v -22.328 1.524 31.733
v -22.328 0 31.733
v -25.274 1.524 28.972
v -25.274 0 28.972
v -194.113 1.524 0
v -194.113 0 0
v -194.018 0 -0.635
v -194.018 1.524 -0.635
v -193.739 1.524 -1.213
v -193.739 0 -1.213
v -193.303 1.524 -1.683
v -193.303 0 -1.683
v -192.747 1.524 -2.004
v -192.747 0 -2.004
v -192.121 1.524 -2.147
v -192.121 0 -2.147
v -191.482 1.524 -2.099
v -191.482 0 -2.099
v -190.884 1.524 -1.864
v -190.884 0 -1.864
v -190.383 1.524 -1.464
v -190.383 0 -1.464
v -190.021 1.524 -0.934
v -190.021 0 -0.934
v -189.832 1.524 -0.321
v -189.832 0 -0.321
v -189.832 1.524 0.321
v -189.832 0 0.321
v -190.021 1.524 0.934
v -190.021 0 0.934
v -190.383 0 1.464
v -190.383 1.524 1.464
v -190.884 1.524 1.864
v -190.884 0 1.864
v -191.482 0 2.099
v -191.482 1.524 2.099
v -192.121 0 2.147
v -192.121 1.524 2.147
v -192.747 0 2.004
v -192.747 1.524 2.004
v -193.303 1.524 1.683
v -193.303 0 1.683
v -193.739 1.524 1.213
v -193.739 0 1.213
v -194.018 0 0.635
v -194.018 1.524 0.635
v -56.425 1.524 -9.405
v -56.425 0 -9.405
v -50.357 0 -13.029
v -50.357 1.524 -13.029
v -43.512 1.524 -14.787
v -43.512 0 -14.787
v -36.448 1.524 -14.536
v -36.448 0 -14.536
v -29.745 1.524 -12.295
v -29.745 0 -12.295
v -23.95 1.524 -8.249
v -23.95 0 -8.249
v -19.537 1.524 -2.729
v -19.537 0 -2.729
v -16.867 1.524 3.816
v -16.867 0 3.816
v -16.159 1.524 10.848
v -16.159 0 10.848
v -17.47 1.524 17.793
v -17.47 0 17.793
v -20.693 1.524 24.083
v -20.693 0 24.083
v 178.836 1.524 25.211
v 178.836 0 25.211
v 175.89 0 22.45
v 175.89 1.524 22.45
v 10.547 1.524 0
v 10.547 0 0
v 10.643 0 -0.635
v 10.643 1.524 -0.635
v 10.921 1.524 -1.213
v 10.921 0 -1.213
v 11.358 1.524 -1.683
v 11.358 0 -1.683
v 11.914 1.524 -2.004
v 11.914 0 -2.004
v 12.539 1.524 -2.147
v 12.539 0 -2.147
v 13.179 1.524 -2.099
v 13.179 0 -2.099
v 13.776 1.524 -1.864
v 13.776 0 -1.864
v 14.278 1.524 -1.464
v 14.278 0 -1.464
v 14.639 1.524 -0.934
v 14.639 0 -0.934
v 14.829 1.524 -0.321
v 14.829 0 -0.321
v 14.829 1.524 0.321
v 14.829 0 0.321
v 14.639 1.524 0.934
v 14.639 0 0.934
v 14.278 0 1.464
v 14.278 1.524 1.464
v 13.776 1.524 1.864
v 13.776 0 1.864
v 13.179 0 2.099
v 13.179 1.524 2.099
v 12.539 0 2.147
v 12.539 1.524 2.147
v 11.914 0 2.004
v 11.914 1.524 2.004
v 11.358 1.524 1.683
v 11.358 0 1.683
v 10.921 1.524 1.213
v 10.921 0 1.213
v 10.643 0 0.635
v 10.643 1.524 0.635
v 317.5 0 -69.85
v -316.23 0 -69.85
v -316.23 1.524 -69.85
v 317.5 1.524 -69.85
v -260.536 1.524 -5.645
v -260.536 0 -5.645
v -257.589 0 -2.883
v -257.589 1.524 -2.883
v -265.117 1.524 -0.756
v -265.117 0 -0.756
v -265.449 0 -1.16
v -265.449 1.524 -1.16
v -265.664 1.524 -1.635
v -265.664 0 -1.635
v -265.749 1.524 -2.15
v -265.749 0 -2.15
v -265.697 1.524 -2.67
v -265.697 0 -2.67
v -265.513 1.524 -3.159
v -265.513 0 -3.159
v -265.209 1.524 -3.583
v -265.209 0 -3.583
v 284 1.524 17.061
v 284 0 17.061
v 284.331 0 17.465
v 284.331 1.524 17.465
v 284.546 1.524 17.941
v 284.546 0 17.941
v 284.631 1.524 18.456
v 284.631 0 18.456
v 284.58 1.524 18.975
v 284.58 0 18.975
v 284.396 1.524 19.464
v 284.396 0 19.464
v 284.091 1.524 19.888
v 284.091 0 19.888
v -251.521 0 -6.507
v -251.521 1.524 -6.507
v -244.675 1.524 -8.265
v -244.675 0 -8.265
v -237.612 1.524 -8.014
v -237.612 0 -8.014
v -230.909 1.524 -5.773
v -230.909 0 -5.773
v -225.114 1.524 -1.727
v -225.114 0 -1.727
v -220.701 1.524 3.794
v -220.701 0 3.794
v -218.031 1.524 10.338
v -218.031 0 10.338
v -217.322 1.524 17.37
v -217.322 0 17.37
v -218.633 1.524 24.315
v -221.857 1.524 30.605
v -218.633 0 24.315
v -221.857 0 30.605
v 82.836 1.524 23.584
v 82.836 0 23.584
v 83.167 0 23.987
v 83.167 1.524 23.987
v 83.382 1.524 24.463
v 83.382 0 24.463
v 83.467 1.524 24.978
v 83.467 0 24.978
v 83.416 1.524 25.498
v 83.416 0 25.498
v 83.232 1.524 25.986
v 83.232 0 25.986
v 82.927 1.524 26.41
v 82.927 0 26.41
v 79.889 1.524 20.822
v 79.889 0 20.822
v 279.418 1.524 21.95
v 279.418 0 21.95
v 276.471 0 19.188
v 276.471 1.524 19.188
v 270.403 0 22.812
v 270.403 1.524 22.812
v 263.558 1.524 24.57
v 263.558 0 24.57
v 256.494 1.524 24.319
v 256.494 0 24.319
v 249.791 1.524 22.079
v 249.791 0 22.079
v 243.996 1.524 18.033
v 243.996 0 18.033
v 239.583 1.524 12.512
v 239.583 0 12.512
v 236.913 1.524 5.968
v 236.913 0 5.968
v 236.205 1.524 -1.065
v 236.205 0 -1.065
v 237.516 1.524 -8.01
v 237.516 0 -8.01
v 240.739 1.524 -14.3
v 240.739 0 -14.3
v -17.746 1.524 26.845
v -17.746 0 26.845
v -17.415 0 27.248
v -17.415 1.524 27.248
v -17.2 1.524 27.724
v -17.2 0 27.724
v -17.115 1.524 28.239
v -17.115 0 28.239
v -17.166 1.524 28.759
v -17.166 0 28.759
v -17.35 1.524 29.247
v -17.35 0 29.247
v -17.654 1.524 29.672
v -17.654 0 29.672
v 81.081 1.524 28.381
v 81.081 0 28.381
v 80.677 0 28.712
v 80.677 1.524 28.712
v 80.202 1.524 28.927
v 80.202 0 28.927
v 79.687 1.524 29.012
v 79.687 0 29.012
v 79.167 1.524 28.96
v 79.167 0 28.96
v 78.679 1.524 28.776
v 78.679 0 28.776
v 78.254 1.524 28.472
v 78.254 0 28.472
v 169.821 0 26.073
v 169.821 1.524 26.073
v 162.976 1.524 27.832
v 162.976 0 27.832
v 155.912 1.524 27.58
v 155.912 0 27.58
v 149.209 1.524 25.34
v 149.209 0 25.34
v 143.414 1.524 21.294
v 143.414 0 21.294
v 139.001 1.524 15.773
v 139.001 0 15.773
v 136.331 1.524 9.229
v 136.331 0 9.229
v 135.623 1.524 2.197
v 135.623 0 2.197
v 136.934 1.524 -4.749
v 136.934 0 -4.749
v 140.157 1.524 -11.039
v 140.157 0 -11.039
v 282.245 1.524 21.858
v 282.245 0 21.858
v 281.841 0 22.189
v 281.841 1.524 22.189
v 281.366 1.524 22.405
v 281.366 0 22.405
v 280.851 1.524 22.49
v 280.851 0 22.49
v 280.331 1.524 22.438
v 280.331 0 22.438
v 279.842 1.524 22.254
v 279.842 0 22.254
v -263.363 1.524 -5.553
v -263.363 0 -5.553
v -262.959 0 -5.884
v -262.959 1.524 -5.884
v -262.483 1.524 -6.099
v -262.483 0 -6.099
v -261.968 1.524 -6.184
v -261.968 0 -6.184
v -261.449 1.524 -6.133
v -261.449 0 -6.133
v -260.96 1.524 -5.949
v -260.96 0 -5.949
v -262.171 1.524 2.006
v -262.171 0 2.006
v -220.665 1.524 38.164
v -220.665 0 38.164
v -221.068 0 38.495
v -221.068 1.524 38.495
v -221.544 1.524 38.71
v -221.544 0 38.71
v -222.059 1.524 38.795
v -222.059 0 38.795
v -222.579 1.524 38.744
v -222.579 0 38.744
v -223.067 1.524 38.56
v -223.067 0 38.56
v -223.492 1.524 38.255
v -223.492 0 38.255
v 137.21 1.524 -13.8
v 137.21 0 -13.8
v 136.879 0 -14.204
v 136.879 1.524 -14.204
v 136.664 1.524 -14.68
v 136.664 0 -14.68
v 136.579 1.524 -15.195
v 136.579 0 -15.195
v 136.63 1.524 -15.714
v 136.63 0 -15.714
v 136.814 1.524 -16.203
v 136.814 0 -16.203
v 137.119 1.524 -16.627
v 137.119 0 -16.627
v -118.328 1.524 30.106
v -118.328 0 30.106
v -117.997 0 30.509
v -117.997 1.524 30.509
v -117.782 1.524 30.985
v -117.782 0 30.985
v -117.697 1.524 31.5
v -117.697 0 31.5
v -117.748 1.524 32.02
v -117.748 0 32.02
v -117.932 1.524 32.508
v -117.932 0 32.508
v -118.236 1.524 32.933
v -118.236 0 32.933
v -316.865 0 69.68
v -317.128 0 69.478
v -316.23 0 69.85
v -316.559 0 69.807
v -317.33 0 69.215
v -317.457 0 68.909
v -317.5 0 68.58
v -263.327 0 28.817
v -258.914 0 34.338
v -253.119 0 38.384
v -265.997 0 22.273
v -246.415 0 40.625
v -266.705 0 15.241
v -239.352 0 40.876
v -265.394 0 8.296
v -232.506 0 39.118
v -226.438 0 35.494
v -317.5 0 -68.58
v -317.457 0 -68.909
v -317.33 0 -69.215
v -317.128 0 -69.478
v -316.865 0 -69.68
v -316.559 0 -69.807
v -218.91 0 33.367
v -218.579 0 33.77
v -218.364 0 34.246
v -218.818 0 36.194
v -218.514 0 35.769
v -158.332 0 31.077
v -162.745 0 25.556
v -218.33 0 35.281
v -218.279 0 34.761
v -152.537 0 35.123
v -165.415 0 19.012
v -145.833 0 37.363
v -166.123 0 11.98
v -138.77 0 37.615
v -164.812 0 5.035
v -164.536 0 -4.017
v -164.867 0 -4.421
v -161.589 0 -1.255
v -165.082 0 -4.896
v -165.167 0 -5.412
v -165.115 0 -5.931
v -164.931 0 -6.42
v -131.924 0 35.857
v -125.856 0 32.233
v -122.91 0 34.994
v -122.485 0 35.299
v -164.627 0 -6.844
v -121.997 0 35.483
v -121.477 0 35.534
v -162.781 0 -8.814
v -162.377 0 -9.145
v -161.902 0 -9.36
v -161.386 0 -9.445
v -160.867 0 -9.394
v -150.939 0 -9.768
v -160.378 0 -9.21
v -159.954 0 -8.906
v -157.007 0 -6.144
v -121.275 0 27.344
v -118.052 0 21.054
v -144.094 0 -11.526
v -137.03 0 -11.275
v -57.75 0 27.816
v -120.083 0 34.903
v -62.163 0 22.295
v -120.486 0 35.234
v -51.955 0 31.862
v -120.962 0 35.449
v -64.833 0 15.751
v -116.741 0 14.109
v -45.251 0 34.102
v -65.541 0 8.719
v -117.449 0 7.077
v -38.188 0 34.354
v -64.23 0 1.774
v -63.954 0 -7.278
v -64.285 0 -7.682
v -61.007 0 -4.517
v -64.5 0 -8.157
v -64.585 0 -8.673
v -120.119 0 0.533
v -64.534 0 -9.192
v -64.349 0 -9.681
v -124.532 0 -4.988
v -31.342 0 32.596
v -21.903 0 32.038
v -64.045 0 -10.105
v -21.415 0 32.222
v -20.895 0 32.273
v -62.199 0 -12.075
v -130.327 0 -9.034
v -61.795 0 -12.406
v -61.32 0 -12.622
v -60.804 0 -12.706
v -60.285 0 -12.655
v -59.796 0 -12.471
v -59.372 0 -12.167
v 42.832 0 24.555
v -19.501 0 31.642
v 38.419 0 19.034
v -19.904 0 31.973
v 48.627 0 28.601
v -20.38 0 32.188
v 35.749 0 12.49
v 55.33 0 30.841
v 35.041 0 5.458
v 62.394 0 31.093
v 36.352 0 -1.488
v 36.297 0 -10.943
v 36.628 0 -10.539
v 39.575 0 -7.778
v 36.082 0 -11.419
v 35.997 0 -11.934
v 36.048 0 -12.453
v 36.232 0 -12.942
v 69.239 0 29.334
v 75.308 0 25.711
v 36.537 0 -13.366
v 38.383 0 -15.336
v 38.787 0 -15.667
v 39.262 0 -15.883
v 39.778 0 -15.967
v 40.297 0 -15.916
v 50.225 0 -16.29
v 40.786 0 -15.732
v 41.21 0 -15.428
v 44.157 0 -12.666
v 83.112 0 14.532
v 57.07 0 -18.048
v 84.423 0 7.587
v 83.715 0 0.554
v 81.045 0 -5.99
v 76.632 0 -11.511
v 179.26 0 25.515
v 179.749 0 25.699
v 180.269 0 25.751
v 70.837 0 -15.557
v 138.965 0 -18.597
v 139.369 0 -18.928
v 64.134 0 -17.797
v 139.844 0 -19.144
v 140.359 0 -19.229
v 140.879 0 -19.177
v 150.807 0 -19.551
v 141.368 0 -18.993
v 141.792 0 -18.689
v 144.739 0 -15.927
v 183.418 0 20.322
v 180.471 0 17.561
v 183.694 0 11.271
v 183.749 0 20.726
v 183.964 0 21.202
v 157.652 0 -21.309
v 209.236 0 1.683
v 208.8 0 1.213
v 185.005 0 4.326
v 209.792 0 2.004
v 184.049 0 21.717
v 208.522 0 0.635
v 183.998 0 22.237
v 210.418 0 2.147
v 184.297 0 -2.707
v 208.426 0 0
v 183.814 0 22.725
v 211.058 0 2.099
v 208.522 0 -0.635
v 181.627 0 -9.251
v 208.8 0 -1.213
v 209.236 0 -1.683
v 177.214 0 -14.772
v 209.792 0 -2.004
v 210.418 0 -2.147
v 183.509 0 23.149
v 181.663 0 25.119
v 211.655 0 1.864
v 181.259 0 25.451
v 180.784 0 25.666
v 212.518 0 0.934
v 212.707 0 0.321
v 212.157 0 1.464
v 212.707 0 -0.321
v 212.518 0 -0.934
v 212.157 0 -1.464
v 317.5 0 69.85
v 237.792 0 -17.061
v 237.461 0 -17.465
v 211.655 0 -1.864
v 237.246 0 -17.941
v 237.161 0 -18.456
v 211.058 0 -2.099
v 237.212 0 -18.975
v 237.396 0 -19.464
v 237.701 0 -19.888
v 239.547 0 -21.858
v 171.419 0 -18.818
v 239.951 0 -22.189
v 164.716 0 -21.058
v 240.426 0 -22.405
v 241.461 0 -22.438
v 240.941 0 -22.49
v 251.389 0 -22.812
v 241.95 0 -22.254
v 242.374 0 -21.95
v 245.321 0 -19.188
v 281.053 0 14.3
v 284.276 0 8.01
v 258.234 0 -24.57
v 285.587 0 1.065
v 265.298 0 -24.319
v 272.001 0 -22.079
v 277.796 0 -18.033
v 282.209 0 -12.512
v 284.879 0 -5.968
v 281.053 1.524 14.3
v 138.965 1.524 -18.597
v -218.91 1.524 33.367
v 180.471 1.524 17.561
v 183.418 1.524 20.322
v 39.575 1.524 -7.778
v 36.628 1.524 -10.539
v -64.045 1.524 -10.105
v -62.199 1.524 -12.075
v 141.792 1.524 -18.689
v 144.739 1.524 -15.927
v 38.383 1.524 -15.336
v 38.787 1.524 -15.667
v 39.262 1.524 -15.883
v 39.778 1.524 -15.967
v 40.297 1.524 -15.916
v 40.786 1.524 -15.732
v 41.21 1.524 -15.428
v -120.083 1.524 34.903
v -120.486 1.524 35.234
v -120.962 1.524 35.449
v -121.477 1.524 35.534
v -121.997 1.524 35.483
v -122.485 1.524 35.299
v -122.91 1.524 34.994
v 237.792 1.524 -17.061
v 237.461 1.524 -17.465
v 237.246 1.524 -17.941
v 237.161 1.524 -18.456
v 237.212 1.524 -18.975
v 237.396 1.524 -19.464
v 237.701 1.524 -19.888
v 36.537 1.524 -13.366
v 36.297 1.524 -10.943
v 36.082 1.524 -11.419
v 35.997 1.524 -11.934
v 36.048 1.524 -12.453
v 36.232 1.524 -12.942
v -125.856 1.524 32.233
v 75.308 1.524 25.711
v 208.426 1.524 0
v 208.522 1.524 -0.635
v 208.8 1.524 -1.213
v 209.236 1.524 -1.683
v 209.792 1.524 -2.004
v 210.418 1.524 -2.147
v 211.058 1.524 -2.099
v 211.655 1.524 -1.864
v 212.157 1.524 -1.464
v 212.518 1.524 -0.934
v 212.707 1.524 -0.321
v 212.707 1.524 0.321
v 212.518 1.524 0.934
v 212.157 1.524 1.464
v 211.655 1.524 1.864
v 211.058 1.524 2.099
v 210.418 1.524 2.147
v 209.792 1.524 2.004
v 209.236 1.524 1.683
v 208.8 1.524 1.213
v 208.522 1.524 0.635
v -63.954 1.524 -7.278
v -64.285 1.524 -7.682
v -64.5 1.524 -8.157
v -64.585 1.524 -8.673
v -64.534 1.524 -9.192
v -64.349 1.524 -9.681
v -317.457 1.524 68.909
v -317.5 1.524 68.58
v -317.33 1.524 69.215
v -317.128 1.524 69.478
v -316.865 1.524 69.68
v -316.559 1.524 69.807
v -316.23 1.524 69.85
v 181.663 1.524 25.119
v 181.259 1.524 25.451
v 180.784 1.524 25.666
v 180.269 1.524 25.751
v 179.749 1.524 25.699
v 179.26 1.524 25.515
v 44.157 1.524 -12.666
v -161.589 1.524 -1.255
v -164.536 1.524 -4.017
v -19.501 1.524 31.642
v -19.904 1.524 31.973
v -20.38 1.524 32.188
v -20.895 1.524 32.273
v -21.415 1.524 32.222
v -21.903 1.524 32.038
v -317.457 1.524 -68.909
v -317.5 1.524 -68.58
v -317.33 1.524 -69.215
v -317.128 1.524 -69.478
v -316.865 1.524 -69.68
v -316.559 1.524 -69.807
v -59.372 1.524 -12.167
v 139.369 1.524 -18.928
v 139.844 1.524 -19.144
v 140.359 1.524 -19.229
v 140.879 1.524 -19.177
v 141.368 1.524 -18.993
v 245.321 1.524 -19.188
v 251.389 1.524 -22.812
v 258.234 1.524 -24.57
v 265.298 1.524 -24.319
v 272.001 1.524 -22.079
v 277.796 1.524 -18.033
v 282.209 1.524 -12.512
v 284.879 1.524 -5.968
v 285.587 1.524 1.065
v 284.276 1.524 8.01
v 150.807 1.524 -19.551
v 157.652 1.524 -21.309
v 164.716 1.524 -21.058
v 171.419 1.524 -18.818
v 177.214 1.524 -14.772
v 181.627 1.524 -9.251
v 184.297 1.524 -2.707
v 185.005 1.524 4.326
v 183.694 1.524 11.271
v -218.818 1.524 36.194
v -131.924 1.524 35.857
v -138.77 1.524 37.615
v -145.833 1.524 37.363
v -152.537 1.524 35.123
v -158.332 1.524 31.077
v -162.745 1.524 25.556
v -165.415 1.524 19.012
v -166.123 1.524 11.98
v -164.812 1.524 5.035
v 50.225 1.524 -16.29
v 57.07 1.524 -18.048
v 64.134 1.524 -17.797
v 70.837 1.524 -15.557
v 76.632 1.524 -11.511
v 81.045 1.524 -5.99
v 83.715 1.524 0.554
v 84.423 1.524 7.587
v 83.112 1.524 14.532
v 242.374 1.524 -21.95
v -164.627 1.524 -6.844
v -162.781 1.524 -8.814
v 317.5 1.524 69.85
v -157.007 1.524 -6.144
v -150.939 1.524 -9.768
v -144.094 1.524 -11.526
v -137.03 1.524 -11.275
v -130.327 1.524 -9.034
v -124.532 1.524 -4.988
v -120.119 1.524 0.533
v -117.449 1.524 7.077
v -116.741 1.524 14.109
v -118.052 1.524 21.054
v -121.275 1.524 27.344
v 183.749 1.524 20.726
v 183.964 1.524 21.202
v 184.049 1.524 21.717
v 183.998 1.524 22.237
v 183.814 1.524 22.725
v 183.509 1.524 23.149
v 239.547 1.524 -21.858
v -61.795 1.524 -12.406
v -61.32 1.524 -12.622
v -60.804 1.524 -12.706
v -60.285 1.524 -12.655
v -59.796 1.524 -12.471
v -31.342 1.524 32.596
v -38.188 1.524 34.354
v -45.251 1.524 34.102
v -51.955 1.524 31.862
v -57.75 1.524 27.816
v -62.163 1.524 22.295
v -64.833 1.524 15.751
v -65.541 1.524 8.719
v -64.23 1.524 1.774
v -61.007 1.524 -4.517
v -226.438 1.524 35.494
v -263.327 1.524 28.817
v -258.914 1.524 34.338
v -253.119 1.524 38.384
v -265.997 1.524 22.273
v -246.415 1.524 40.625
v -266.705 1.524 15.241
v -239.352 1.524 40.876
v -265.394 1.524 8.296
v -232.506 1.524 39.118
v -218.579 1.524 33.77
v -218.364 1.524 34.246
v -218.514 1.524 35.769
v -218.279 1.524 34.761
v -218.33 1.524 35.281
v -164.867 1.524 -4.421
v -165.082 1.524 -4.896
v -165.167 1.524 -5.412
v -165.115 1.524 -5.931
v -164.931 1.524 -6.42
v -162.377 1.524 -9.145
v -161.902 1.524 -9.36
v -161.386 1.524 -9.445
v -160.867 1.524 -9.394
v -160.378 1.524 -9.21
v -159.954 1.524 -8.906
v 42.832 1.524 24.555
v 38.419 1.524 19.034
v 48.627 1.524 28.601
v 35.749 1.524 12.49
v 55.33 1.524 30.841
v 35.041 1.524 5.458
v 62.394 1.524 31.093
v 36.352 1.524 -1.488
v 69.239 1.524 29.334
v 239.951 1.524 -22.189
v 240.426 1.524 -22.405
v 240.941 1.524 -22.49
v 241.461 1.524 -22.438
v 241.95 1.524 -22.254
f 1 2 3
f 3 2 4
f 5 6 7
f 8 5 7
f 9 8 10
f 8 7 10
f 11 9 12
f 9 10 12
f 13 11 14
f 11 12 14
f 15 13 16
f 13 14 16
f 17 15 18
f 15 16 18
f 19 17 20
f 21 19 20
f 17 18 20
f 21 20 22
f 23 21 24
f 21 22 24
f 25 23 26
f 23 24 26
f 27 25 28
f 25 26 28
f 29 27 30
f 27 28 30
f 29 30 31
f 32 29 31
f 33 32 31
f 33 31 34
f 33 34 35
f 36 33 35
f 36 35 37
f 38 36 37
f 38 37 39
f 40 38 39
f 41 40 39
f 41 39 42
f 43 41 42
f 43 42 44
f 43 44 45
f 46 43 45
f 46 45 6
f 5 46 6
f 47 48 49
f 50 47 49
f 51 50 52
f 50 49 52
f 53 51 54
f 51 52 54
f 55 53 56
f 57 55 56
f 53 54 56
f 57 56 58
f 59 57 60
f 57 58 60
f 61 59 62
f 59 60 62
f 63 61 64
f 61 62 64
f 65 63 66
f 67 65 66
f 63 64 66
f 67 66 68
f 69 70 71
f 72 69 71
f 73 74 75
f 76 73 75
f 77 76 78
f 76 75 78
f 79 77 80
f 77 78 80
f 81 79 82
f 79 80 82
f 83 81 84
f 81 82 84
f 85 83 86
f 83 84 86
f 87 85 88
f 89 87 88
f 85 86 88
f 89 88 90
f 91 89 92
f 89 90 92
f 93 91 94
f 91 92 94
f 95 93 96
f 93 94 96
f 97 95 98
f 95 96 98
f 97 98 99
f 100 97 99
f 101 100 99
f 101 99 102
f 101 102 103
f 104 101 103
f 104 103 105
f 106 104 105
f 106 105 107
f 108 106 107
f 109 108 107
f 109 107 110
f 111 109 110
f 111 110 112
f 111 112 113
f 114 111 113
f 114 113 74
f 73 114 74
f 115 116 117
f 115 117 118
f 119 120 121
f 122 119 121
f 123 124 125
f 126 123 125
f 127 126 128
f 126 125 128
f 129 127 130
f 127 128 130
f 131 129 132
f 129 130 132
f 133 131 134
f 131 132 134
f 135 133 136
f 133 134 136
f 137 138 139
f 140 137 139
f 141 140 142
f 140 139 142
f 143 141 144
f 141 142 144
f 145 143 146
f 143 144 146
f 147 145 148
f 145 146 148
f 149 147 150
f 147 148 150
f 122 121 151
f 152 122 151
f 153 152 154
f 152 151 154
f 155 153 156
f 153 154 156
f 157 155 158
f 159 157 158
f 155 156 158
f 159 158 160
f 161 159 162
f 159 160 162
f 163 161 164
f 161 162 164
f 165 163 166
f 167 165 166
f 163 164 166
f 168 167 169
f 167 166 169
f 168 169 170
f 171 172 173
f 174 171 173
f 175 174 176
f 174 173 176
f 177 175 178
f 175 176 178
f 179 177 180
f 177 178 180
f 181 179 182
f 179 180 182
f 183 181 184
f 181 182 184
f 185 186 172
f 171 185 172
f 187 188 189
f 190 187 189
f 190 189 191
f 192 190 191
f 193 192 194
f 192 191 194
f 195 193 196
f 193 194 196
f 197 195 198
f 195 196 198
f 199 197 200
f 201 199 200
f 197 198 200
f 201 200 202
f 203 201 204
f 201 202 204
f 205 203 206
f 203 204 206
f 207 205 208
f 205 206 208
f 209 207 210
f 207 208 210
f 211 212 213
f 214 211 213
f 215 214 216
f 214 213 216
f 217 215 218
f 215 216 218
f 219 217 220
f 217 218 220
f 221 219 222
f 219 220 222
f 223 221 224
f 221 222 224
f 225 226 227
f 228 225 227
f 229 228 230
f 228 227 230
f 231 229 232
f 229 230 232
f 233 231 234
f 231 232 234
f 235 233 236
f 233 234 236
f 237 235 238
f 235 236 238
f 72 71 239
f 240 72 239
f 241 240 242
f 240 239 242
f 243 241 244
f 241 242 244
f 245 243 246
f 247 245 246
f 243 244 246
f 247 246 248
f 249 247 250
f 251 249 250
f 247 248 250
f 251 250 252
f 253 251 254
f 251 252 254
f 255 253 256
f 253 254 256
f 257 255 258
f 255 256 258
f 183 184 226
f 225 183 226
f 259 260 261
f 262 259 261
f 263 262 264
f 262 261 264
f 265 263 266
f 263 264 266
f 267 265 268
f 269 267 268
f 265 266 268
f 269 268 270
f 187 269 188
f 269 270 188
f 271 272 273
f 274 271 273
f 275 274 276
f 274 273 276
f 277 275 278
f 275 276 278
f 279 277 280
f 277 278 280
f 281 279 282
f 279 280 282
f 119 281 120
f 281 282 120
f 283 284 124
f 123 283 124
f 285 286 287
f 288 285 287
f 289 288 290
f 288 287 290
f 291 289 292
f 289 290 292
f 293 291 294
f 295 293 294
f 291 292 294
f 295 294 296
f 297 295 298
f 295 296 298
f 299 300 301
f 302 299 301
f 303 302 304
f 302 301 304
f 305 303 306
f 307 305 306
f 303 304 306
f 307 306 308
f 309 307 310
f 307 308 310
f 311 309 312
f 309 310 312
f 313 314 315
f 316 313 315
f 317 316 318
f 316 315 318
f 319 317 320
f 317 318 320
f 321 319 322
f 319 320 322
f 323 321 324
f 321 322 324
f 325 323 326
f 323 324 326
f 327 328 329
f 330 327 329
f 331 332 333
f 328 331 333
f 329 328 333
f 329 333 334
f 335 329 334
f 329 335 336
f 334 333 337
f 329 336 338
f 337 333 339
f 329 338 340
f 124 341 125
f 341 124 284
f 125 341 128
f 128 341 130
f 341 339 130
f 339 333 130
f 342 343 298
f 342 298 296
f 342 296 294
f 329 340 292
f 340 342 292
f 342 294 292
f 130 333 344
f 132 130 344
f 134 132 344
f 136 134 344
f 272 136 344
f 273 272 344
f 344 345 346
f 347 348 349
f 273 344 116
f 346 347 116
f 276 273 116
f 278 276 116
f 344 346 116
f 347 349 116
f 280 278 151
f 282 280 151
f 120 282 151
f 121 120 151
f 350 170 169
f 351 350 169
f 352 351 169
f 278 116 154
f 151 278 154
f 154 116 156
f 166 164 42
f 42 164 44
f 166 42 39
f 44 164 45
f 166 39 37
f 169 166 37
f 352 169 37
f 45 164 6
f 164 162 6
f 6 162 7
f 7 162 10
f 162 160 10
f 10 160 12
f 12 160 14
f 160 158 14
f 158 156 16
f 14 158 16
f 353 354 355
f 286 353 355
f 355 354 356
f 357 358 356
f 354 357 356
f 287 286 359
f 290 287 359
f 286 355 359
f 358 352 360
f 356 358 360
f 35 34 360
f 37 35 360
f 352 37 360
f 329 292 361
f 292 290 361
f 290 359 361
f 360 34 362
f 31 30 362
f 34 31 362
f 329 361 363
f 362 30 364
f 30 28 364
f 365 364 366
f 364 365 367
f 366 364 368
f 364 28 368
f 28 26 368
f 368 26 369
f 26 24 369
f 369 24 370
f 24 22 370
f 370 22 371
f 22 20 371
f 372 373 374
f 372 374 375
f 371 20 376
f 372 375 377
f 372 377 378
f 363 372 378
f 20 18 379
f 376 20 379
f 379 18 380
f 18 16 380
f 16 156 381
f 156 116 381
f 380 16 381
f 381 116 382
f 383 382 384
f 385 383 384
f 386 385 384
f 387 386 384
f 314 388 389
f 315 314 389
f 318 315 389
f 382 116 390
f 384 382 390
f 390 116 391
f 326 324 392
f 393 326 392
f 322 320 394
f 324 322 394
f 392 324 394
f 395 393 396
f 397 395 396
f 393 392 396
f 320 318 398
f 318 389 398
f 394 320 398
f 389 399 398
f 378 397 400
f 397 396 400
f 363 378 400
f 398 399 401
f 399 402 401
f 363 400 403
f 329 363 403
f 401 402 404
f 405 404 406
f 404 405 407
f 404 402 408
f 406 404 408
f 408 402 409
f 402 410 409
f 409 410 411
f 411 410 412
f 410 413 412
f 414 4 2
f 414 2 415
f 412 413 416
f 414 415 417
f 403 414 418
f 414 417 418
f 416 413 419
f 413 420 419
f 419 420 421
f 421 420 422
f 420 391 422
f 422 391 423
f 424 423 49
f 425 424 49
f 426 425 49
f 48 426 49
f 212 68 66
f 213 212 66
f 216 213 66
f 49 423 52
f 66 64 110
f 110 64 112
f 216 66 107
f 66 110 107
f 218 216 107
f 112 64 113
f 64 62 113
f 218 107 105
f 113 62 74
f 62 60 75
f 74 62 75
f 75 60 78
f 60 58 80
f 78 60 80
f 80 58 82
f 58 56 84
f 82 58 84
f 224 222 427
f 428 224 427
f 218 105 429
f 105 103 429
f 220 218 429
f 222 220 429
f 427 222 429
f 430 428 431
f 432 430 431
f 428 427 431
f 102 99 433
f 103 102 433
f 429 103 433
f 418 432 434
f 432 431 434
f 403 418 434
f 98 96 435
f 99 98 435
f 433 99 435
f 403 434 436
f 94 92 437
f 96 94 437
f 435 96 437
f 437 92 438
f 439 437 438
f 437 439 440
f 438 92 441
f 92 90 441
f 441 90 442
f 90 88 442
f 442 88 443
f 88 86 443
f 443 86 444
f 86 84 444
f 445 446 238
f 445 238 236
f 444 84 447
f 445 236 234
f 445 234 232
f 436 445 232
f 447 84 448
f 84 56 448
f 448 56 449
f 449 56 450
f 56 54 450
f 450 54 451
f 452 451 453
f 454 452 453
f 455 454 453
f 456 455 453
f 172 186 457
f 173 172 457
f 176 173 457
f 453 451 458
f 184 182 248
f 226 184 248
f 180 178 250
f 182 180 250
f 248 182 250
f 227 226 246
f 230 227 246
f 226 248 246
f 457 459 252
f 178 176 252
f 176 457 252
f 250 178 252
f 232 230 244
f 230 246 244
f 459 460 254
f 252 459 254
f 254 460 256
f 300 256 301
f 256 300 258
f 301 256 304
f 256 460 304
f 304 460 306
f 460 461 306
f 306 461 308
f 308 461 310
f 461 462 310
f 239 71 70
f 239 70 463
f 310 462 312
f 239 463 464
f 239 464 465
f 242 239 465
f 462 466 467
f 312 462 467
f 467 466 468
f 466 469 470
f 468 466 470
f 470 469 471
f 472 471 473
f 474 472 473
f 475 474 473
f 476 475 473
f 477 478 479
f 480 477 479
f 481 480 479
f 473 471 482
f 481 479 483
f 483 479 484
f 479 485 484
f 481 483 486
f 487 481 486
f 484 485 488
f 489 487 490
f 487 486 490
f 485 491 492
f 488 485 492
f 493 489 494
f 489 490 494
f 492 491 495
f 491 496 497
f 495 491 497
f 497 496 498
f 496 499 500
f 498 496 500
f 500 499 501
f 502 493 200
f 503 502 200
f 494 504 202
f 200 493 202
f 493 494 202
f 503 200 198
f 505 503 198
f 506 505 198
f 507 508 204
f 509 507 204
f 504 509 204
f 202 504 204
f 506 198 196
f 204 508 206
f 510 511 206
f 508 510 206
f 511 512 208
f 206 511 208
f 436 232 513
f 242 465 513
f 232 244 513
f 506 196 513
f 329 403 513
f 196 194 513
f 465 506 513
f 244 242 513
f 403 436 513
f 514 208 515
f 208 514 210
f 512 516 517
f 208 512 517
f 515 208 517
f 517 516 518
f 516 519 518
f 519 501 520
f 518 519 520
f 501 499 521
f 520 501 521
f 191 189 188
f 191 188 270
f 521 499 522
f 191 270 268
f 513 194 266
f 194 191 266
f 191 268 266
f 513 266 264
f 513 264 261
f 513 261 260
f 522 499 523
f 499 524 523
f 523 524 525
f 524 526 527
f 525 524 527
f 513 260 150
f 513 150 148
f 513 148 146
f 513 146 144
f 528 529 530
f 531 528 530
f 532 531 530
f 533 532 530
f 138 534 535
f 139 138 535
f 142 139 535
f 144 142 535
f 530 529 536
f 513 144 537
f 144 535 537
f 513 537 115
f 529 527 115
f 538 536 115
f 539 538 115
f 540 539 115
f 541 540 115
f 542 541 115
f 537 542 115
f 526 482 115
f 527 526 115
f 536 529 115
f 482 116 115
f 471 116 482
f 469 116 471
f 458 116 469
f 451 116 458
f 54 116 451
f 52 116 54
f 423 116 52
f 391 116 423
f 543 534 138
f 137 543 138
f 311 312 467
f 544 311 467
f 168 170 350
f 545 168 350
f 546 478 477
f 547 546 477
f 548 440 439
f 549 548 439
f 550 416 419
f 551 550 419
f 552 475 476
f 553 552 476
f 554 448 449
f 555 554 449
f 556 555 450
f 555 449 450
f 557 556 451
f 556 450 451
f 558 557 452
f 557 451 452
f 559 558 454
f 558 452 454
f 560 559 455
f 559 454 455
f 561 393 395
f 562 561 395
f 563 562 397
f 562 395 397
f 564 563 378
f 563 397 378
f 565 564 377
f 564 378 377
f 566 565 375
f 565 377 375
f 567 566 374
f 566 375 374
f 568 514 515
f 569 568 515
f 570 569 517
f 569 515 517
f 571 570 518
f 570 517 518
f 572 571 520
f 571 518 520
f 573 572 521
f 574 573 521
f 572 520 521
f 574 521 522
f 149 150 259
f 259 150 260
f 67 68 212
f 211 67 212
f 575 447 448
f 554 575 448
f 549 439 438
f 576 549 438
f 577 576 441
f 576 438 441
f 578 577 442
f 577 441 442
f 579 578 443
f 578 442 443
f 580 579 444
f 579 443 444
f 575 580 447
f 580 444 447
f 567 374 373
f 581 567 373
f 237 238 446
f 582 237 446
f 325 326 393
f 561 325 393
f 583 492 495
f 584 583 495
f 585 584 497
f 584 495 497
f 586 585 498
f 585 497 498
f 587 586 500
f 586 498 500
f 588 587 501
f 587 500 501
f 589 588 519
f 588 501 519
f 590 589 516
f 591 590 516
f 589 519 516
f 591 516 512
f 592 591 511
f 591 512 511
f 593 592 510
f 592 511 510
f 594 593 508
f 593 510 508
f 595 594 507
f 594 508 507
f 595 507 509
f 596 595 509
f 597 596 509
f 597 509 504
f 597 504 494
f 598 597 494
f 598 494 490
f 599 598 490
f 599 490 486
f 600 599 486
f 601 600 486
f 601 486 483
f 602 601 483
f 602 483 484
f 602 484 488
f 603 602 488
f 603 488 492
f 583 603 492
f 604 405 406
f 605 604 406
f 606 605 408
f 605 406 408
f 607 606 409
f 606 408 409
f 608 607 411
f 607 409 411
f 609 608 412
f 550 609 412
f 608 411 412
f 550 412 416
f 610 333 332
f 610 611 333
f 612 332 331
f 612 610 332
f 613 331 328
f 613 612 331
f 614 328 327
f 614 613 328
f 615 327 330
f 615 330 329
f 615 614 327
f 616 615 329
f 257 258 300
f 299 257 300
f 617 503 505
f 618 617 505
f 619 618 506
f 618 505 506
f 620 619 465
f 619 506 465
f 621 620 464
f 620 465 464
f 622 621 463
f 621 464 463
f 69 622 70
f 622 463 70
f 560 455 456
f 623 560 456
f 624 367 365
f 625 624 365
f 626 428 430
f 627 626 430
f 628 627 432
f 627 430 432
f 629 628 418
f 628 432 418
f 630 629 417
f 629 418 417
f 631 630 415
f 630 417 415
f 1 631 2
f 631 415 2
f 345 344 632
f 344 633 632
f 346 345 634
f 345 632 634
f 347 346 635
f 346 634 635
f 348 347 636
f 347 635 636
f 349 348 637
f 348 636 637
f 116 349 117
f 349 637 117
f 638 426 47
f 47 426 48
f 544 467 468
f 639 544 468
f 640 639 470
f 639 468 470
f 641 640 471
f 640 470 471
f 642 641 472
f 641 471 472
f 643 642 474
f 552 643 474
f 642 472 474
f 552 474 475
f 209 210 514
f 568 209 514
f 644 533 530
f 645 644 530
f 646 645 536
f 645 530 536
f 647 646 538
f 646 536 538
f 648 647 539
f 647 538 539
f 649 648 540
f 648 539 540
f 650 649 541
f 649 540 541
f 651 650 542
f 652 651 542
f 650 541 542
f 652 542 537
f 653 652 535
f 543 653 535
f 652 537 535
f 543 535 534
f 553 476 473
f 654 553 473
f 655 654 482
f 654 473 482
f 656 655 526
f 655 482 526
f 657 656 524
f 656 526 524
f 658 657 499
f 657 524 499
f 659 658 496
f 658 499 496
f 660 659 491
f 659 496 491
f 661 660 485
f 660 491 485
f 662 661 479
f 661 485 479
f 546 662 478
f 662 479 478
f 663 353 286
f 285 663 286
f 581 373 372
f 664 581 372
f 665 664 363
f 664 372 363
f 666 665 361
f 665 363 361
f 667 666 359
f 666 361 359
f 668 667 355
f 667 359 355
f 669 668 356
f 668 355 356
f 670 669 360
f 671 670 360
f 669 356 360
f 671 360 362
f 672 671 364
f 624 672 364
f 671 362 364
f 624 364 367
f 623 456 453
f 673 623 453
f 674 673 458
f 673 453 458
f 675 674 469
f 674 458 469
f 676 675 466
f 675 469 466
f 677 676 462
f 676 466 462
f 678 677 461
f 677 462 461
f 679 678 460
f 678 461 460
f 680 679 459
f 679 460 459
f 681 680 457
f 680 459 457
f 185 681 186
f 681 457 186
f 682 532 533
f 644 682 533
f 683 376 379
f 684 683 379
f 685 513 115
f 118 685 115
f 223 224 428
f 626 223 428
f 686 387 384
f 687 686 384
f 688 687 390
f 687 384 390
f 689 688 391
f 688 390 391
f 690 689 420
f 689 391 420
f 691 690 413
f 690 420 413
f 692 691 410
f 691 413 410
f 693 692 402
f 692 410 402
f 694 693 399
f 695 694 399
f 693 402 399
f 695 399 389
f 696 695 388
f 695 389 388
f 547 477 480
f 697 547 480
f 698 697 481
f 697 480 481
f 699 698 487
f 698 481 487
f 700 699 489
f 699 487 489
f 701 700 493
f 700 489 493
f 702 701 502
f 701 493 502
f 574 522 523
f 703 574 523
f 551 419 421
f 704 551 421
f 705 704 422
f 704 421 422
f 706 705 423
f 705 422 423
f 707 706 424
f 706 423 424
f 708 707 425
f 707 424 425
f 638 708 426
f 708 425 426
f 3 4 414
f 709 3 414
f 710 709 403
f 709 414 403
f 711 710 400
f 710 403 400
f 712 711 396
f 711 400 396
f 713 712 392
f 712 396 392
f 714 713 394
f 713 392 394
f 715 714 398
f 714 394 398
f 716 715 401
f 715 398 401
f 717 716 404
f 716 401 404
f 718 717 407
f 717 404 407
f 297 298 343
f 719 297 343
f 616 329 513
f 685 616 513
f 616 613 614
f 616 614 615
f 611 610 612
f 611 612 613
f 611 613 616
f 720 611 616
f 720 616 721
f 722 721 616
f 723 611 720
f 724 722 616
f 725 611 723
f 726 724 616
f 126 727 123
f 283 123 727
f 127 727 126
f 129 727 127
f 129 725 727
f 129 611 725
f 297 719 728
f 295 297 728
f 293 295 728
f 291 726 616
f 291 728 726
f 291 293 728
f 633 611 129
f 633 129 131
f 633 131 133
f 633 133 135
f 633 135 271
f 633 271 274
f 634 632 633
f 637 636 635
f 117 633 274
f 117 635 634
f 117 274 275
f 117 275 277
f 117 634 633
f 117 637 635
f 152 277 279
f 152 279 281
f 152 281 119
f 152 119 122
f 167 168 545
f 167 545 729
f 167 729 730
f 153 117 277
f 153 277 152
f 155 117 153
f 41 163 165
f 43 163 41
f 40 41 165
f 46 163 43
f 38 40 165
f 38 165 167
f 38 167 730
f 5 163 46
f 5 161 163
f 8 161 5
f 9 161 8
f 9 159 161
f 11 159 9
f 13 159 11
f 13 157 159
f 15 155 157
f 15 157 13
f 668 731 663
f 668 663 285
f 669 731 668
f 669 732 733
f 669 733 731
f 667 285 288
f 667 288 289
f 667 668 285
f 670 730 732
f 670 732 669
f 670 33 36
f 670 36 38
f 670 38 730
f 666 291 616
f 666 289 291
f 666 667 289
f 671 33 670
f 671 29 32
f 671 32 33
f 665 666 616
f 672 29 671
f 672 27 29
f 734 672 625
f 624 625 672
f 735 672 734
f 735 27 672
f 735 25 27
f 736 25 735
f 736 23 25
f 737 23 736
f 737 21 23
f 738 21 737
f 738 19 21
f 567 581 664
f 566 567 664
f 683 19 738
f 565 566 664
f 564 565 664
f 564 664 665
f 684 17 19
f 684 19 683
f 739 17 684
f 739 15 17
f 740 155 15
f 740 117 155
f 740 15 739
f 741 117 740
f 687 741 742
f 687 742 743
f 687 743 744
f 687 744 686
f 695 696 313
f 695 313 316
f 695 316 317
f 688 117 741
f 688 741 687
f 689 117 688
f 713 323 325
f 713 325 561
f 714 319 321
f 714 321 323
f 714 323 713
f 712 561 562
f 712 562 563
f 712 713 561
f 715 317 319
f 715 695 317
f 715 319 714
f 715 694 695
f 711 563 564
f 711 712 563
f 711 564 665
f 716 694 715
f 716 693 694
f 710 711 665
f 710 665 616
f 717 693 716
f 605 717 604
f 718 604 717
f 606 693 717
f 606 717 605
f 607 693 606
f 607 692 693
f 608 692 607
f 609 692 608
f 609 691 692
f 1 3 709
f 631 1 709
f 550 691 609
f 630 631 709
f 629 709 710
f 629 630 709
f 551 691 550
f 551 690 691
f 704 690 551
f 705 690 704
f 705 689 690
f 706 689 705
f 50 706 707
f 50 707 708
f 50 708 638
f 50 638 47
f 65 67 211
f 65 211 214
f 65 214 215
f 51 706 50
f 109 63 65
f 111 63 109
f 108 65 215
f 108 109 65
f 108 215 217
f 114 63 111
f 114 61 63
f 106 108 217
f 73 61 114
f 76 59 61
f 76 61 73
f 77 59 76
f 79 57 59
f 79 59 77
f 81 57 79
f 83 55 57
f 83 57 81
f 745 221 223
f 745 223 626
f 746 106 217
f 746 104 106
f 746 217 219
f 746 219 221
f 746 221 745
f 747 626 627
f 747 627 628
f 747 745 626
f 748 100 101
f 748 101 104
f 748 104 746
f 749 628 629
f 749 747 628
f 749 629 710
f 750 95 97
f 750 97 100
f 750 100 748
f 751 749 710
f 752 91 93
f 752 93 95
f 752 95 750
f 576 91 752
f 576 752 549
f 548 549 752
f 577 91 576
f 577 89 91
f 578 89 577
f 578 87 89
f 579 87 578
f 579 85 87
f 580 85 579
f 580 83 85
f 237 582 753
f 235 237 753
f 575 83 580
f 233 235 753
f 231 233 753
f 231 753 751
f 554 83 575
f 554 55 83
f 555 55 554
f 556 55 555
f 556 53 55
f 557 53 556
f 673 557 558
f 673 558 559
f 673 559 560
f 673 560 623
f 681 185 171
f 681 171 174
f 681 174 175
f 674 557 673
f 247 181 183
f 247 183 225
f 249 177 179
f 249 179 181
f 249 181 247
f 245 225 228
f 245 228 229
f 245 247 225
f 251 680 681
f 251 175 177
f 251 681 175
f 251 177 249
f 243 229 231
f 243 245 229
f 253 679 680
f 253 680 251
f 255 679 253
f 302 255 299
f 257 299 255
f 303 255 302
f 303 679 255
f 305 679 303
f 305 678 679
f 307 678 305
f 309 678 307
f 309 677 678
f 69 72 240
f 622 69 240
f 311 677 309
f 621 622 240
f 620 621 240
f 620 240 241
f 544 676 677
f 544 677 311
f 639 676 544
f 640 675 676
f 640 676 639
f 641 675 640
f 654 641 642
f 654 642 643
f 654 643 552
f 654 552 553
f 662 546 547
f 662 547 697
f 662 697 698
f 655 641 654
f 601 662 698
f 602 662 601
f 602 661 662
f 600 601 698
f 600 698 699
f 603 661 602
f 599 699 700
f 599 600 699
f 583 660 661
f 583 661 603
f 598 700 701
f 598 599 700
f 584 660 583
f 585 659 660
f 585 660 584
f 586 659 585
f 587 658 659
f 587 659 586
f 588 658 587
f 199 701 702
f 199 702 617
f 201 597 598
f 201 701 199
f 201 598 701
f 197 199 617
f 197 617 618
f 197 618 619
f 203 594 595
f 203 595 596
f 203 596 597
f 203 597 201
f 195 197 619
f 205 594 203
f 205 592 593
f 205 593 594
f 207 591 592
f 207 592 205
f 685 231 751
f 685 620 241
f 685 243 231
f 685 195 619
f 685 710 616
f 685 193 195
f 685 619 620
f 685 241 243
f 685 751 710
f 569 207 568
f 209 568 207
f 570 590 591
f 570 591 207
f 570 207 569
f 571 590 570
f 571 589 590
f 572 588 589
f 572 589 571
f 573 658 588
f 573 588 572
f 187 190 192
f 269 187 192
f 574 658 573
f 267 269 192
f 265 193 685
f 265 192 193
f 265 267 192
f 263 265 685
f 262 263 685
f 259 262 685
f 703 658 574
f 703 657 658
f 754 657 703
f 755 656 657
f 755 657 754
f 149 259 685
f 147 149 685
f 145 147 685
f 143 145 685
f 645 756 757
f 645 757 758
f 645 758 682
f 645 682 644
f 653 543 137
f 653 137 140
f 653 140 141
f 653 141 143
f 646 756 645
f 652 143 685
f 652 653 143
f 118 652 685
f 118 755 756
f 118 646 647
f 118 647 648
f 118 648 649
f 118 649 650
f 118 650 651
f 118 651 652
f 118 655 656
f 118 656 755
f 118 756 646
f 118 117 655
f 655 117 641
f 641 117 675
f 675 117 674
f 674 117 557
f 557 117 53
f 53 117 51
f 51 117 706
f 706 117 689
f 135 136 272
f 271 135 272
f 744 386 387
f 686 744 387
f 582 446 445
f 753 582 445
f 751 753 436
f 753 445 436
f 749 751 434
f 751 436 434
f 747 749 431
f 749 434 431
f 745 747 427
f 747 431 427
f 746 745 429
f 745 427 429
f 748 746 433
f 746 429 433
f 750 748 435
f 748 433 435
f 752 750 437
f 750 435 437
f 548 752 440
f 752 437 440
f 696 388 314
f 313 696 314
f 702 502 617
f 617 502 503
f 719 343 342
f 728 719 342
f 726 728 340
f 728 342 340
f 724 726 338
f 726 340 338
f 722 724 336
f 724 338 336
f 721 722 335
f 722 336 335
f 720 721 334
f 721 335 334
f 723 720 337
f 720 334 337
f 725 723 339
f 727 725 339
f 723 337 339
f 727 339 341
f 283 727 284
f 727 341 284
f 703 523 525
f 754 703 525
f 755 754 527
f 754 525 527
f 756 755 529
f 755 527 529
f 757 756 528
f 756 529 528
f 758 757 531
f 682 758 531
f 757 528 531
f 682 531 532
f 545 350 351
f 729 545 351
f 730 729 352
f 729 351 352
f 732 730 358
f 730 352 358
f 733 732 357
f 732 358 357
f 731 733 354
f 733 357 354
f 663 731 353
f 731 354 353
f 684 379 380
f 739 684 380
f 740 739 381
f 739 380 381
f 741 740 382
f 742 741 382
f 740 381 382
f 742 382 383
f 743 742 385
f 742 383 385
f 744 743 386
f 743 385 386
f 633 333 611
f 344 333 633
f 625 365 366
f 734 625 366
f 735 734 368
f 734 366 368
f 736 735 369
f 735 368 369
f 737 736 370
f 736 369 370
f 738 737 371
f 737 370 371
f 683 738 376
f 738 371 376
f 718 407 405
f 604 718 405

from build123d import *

# Parameters (mm, degrees)
SKETCH2_W             = 635
SKETCH2_H             = 139.7
BOSS_EXTRUDE1_DEPTH   = 1.524
FILLET1_R             = 1.27
F_8_CLEARANCE_HOLE1_D = 4.3053


with BuildPart() as part:
    # Sketch2 → Boss-Extrude1 (new body)
    with BuildSketch(Plane(origin=(0, 0, 0), x_dir=(1, 0, 0), z_dir=(0, 1, 0))):
        Rectangle(SKETCH2_W, SKETCH2_H)
        with BuildLine():
            Line((180.471121526, -17.560883985), (183.417760323, -20.322450333))
            ThreePointArc((183.417760323, -20.322450333), (184.049066919, -21.716938673), (183.509415933, -23.14939201))
            Line((183.509415933, -23.14939201), (181.663097836, -25.119445179))
            ThreePointArc((181.663097836, -25.119445179), (180.268609495, -25.750751775), (178.836156158, -25.211100788))
            Line((178.836156158, -25.211100788), (175.889517361, -22.44953444))
            ThreePointArc((175.889517361, -22.44953444), (143.413950131, -21.293785193), (140.156982214, 11.038712132))
            Line((140.156982214, 11.038712132), (137.210343417, 13.80027848))
            ThreePointArc((137.210343417, 13.80027848), (136.579036821, 15.194766821), (137.118687808, 16.627220158))
            Line((137.118687808, 16.627220158), (138.965005904, 18.597273327))
            ThreePointArc((138.965005904, 18.597273327), (140.359494245, 19.228579923), (141.791947582, 18.688928936))
            Line((141.791947582, 18.688928936), (144.738586379, 15.927362588))
            ThreePointArc((144.738586379, 15.927362588), (177.214153609, 14.77161334), (180.471121526, -17.560883985))
        make_face(mode=Mode.SUBTRACT)
        with BuildLine():
            Line((242.373895712, 21.950014862), (245.320534509, 19.188448514))
            ThreePointArc((245.320534509, 19.188448514), (277.796101739, 18.032699267), (281.053069656, -14.299798058))
            Line((281.053069656, -14.299798058), (283.999708453, -17.061364407))
            ThreePointArc((283.999708453, -17.061364407), (284.631015049, -18.455852747), (284.091364062, -19.888306084))
            Line((284.091364062, -19.888306084), (282.245045966, -21.858359253))
            ThreePointArc((282.245045966, -21.858359253), (280.850557625, -22.489665849), (279.418104288, -21.950014862))
            Line((279.418104288, -21.950014862), (276.471465491, -19.188448514))
            ThreePointArc((276.471465491, -19.188448514), (243.995898261, -18.032699267), (240.738930344, 14.299798058))
            Line((240.738930344, 14.299798058), (237.792291547, 17.061364407))
            ThreePointArc((237.792291547, 17.061364407), (237.160984951, 18.455852747), (237.700635938, 19.888306084))
            Line((237.700635938, 19.888306084), (239.546954034, 21.858359253))
            ThreePointArc((239.546954034, 21.858359253), (240.941442375, 22.489665849), (242.373895712, 21.950014862))
        make_face(mode=Mode.SUBTRACT)
        with BuildLine():
            Line((39.575034084, 7.777626206), (36.628395287, 10.539192554))
            ThreePointArc((36.628395287, 10.539192554), (35.997088691, 11.933680895), (36.536739678, 13.366134232))
            Line((36.536739678, 13.366134232), (38.383057774, 15.336187401))
            ThreePointArc((38.383057774, 15.336187401), (39.777546115, 15.967493997), (41.209999452, 15.42784301))
            Line((41.209999452, 15.42784301), (44.156638249, 12.666276662))
            ThreePointArc((44.156638249, 12.666276662), (76.632205479, 11.510527414), (79.889173396, -20.821969911))
            Line((79.889173396, -20.821969911), (82.835812193, -23.583536259))
            ThreePointArc((82.835812193, -23.583536259), (83.467118789, -24.9780246), (82.927467803, -26.410477937))
            Line((82.927467803, -26.410477937), (81.081149706, -28.380531105))
            ThreePointArc((81.081149706, -28.380531105), (79.686661366, -29.011837701), (78.254208028, -28.472186714))
            Line((78.254208028, -28.472186714), (75.307569231, -25.710620366))
            ThreePointArc((75.307569231, -25.710620366), (42.832002001, -24.554871119), (39.575034084, 7.777626206))
        make_face(mode=Mode.SUBTRACT)
        with BuildLine():
            Line((-61.006914046, 4.51654028), (-63.953552843, 7.278106628))
            ThreePointArc((-63.953552843, 7.278106628), (-64.584859439, 8.672594969), (-64.045208452, 10.105048306))
            Line((-64.045208452, 10.105048306), (-62.198890356, 12.075101475))
            ThreePointArc((-62.198890356, 12.075101475), (-60.804402015, 12.706408071), (-59.371948678, 12.166757084))
            Line((-59.371948678, 12.166757084), (-56.425309881, 9.405190735))
            ThreePointArc((-56.425309881, 9.405190735), (-23.949742651, 8.249441488), (-20.692774734, -24.083055837))
            Line((-20.692774734, -24.083055837), (-17.746135937, -26.844622185))
            ThreePointArc((-17.746135937, -26.844622185), (-17.114829341, -28.239110526), (-17.654480327, -29.671563863))
            Line((-17.654480327, -29.671563863), (-19.500798424, -31.641617031))
            ThreePointArc((-19.500798424, -31.641617031), (-20.895286764, -32.272923627), (-22.327740102, -31.73327264))
            Line((-22.327740102, -31.73327264), (-25.274378899, -28.971706292))
            ThreePointArc((-25.274378899, -28.971706292), (-57.749946129, -27.815957045), (-61.006914046, 4.51654028))
        make_face(mode=Mode.SUBTRACT)
        with BuildLine():
            Line((-161.588862176, 1.255454354), (-164.535500973, 4.017020702))
            ThreePointArc((-164.535500973, 4.017020702), (-165.166807569, 5.411509043), (-164.627156582, 6.84396238))
            Line((-164.627156582, 6.84396238), (-162.780838486, 8.814015548))
            ThreePointArc((-162.780838486, 8.814015548), (-161.386350145, 9.445322144), (-159.953896808, 8.905671157))
            Line((-159.953896808, 8.905671157), (-157.007258011, 6.144104809))
            ThreePointArc((-157.007258011, 6.144104809), (-124.53169078, 4.988355562), (-121.274722864, -27.344141763))
            Line((-121.274722864, -27.344141763), (-118.328084067, -30.105708111))
            ThreePointArc((-118.328084067, -30.105708111), (-117.696777471, -31.500196452), (-118.236428457, -32.932649789))
            Line((-118.236428457, -32.932649789), (-120.082746554, -34.902702958))
            ThreePointArc((-120.082746554, -34.902702958), (-121.477234894, -35.534009554), (-122.909688232, -34.994358567))
            Line((-122.909688232, -34.994358567), (-125.856327029, -32.232792218))
            ThreePointArc((-125.856327029, -32.232792218), (-158.331894259, -31.077042971), (-161.588862176, 1.255454354))
        make_face(mode=Mode.SUBTRACT)
        with BuildLine():
            Line((-221.856670994, -30.605227689), (-218.910032197, -33.366794037))
            ThreePointArc((-218.910032197, -33.366794037), (-218.2787256, -34.761282378), (-218.818376587, -36.193735715))
            Line((-218.818376587, -36.193735715), (-220.664694684, -38.163788884))
            ThreePointArc((-220.664694684, -38.163788884), (-222.059183024, -38.79509548), (-223.491636361, -38.255444493))
            Line((-223.491636361, -38.255444493), (-226.438275159, -35.493878145))
            ThreePointArc((-226.438275159, -35.493878145), (-258.913842389, -34.338128897), (-262.170810306, -2.005631572))
            Line((-262.170810306, -2.005631572), (-265.117449103, 0.755934776))
            ThreePointArc((-265.117449103, 0.755934776), (-265.748755699, 2.150423117), (-265.209104712, 3.582876454))
            Line((-265.209104712, 3.582876454), (-263.362786616, 5.552929622))
            ThreePointArc((-263.362786616, 5.552929622), (-261.968298275, 6.184236218), (-260.535844938, 5.644585231))
            Line((-260.535844938, 5.644585231), (-257.589206141, 2.883018883))
            ThreePointArc((-257.589206141, 2.883018883), (-225.11363891, 1.727269636), (-221.856670994, -30.605227689))
        make_face(mode=Mode.SUBTRACT)
    extrude(amount=BOSS_EXTRUDE1_DEPTH)

    # Fillet1
    fillet1_edges = [part.edges().sort_by_distance(p)[0] for p in [
        (-317.5, 0.762, 69.85),
        (-317.5, 0.762, -69.85),
    ]]
    fillet(fillet1_edges, radius=FILLET1_R)

    # #8 Clearance Hole1 (through all)
    with Locations(Plane(origin=(0, 1.524, 0), x_dir=(1, 0, 0), z_dir=(0, 1, 0))):
        with Locations((210.5786, 0), (12.7, 0), (-191.9606, 0)):
            Hole(F_8_CLEARANCE_HOLE1_D / 2)


solid = part.part
